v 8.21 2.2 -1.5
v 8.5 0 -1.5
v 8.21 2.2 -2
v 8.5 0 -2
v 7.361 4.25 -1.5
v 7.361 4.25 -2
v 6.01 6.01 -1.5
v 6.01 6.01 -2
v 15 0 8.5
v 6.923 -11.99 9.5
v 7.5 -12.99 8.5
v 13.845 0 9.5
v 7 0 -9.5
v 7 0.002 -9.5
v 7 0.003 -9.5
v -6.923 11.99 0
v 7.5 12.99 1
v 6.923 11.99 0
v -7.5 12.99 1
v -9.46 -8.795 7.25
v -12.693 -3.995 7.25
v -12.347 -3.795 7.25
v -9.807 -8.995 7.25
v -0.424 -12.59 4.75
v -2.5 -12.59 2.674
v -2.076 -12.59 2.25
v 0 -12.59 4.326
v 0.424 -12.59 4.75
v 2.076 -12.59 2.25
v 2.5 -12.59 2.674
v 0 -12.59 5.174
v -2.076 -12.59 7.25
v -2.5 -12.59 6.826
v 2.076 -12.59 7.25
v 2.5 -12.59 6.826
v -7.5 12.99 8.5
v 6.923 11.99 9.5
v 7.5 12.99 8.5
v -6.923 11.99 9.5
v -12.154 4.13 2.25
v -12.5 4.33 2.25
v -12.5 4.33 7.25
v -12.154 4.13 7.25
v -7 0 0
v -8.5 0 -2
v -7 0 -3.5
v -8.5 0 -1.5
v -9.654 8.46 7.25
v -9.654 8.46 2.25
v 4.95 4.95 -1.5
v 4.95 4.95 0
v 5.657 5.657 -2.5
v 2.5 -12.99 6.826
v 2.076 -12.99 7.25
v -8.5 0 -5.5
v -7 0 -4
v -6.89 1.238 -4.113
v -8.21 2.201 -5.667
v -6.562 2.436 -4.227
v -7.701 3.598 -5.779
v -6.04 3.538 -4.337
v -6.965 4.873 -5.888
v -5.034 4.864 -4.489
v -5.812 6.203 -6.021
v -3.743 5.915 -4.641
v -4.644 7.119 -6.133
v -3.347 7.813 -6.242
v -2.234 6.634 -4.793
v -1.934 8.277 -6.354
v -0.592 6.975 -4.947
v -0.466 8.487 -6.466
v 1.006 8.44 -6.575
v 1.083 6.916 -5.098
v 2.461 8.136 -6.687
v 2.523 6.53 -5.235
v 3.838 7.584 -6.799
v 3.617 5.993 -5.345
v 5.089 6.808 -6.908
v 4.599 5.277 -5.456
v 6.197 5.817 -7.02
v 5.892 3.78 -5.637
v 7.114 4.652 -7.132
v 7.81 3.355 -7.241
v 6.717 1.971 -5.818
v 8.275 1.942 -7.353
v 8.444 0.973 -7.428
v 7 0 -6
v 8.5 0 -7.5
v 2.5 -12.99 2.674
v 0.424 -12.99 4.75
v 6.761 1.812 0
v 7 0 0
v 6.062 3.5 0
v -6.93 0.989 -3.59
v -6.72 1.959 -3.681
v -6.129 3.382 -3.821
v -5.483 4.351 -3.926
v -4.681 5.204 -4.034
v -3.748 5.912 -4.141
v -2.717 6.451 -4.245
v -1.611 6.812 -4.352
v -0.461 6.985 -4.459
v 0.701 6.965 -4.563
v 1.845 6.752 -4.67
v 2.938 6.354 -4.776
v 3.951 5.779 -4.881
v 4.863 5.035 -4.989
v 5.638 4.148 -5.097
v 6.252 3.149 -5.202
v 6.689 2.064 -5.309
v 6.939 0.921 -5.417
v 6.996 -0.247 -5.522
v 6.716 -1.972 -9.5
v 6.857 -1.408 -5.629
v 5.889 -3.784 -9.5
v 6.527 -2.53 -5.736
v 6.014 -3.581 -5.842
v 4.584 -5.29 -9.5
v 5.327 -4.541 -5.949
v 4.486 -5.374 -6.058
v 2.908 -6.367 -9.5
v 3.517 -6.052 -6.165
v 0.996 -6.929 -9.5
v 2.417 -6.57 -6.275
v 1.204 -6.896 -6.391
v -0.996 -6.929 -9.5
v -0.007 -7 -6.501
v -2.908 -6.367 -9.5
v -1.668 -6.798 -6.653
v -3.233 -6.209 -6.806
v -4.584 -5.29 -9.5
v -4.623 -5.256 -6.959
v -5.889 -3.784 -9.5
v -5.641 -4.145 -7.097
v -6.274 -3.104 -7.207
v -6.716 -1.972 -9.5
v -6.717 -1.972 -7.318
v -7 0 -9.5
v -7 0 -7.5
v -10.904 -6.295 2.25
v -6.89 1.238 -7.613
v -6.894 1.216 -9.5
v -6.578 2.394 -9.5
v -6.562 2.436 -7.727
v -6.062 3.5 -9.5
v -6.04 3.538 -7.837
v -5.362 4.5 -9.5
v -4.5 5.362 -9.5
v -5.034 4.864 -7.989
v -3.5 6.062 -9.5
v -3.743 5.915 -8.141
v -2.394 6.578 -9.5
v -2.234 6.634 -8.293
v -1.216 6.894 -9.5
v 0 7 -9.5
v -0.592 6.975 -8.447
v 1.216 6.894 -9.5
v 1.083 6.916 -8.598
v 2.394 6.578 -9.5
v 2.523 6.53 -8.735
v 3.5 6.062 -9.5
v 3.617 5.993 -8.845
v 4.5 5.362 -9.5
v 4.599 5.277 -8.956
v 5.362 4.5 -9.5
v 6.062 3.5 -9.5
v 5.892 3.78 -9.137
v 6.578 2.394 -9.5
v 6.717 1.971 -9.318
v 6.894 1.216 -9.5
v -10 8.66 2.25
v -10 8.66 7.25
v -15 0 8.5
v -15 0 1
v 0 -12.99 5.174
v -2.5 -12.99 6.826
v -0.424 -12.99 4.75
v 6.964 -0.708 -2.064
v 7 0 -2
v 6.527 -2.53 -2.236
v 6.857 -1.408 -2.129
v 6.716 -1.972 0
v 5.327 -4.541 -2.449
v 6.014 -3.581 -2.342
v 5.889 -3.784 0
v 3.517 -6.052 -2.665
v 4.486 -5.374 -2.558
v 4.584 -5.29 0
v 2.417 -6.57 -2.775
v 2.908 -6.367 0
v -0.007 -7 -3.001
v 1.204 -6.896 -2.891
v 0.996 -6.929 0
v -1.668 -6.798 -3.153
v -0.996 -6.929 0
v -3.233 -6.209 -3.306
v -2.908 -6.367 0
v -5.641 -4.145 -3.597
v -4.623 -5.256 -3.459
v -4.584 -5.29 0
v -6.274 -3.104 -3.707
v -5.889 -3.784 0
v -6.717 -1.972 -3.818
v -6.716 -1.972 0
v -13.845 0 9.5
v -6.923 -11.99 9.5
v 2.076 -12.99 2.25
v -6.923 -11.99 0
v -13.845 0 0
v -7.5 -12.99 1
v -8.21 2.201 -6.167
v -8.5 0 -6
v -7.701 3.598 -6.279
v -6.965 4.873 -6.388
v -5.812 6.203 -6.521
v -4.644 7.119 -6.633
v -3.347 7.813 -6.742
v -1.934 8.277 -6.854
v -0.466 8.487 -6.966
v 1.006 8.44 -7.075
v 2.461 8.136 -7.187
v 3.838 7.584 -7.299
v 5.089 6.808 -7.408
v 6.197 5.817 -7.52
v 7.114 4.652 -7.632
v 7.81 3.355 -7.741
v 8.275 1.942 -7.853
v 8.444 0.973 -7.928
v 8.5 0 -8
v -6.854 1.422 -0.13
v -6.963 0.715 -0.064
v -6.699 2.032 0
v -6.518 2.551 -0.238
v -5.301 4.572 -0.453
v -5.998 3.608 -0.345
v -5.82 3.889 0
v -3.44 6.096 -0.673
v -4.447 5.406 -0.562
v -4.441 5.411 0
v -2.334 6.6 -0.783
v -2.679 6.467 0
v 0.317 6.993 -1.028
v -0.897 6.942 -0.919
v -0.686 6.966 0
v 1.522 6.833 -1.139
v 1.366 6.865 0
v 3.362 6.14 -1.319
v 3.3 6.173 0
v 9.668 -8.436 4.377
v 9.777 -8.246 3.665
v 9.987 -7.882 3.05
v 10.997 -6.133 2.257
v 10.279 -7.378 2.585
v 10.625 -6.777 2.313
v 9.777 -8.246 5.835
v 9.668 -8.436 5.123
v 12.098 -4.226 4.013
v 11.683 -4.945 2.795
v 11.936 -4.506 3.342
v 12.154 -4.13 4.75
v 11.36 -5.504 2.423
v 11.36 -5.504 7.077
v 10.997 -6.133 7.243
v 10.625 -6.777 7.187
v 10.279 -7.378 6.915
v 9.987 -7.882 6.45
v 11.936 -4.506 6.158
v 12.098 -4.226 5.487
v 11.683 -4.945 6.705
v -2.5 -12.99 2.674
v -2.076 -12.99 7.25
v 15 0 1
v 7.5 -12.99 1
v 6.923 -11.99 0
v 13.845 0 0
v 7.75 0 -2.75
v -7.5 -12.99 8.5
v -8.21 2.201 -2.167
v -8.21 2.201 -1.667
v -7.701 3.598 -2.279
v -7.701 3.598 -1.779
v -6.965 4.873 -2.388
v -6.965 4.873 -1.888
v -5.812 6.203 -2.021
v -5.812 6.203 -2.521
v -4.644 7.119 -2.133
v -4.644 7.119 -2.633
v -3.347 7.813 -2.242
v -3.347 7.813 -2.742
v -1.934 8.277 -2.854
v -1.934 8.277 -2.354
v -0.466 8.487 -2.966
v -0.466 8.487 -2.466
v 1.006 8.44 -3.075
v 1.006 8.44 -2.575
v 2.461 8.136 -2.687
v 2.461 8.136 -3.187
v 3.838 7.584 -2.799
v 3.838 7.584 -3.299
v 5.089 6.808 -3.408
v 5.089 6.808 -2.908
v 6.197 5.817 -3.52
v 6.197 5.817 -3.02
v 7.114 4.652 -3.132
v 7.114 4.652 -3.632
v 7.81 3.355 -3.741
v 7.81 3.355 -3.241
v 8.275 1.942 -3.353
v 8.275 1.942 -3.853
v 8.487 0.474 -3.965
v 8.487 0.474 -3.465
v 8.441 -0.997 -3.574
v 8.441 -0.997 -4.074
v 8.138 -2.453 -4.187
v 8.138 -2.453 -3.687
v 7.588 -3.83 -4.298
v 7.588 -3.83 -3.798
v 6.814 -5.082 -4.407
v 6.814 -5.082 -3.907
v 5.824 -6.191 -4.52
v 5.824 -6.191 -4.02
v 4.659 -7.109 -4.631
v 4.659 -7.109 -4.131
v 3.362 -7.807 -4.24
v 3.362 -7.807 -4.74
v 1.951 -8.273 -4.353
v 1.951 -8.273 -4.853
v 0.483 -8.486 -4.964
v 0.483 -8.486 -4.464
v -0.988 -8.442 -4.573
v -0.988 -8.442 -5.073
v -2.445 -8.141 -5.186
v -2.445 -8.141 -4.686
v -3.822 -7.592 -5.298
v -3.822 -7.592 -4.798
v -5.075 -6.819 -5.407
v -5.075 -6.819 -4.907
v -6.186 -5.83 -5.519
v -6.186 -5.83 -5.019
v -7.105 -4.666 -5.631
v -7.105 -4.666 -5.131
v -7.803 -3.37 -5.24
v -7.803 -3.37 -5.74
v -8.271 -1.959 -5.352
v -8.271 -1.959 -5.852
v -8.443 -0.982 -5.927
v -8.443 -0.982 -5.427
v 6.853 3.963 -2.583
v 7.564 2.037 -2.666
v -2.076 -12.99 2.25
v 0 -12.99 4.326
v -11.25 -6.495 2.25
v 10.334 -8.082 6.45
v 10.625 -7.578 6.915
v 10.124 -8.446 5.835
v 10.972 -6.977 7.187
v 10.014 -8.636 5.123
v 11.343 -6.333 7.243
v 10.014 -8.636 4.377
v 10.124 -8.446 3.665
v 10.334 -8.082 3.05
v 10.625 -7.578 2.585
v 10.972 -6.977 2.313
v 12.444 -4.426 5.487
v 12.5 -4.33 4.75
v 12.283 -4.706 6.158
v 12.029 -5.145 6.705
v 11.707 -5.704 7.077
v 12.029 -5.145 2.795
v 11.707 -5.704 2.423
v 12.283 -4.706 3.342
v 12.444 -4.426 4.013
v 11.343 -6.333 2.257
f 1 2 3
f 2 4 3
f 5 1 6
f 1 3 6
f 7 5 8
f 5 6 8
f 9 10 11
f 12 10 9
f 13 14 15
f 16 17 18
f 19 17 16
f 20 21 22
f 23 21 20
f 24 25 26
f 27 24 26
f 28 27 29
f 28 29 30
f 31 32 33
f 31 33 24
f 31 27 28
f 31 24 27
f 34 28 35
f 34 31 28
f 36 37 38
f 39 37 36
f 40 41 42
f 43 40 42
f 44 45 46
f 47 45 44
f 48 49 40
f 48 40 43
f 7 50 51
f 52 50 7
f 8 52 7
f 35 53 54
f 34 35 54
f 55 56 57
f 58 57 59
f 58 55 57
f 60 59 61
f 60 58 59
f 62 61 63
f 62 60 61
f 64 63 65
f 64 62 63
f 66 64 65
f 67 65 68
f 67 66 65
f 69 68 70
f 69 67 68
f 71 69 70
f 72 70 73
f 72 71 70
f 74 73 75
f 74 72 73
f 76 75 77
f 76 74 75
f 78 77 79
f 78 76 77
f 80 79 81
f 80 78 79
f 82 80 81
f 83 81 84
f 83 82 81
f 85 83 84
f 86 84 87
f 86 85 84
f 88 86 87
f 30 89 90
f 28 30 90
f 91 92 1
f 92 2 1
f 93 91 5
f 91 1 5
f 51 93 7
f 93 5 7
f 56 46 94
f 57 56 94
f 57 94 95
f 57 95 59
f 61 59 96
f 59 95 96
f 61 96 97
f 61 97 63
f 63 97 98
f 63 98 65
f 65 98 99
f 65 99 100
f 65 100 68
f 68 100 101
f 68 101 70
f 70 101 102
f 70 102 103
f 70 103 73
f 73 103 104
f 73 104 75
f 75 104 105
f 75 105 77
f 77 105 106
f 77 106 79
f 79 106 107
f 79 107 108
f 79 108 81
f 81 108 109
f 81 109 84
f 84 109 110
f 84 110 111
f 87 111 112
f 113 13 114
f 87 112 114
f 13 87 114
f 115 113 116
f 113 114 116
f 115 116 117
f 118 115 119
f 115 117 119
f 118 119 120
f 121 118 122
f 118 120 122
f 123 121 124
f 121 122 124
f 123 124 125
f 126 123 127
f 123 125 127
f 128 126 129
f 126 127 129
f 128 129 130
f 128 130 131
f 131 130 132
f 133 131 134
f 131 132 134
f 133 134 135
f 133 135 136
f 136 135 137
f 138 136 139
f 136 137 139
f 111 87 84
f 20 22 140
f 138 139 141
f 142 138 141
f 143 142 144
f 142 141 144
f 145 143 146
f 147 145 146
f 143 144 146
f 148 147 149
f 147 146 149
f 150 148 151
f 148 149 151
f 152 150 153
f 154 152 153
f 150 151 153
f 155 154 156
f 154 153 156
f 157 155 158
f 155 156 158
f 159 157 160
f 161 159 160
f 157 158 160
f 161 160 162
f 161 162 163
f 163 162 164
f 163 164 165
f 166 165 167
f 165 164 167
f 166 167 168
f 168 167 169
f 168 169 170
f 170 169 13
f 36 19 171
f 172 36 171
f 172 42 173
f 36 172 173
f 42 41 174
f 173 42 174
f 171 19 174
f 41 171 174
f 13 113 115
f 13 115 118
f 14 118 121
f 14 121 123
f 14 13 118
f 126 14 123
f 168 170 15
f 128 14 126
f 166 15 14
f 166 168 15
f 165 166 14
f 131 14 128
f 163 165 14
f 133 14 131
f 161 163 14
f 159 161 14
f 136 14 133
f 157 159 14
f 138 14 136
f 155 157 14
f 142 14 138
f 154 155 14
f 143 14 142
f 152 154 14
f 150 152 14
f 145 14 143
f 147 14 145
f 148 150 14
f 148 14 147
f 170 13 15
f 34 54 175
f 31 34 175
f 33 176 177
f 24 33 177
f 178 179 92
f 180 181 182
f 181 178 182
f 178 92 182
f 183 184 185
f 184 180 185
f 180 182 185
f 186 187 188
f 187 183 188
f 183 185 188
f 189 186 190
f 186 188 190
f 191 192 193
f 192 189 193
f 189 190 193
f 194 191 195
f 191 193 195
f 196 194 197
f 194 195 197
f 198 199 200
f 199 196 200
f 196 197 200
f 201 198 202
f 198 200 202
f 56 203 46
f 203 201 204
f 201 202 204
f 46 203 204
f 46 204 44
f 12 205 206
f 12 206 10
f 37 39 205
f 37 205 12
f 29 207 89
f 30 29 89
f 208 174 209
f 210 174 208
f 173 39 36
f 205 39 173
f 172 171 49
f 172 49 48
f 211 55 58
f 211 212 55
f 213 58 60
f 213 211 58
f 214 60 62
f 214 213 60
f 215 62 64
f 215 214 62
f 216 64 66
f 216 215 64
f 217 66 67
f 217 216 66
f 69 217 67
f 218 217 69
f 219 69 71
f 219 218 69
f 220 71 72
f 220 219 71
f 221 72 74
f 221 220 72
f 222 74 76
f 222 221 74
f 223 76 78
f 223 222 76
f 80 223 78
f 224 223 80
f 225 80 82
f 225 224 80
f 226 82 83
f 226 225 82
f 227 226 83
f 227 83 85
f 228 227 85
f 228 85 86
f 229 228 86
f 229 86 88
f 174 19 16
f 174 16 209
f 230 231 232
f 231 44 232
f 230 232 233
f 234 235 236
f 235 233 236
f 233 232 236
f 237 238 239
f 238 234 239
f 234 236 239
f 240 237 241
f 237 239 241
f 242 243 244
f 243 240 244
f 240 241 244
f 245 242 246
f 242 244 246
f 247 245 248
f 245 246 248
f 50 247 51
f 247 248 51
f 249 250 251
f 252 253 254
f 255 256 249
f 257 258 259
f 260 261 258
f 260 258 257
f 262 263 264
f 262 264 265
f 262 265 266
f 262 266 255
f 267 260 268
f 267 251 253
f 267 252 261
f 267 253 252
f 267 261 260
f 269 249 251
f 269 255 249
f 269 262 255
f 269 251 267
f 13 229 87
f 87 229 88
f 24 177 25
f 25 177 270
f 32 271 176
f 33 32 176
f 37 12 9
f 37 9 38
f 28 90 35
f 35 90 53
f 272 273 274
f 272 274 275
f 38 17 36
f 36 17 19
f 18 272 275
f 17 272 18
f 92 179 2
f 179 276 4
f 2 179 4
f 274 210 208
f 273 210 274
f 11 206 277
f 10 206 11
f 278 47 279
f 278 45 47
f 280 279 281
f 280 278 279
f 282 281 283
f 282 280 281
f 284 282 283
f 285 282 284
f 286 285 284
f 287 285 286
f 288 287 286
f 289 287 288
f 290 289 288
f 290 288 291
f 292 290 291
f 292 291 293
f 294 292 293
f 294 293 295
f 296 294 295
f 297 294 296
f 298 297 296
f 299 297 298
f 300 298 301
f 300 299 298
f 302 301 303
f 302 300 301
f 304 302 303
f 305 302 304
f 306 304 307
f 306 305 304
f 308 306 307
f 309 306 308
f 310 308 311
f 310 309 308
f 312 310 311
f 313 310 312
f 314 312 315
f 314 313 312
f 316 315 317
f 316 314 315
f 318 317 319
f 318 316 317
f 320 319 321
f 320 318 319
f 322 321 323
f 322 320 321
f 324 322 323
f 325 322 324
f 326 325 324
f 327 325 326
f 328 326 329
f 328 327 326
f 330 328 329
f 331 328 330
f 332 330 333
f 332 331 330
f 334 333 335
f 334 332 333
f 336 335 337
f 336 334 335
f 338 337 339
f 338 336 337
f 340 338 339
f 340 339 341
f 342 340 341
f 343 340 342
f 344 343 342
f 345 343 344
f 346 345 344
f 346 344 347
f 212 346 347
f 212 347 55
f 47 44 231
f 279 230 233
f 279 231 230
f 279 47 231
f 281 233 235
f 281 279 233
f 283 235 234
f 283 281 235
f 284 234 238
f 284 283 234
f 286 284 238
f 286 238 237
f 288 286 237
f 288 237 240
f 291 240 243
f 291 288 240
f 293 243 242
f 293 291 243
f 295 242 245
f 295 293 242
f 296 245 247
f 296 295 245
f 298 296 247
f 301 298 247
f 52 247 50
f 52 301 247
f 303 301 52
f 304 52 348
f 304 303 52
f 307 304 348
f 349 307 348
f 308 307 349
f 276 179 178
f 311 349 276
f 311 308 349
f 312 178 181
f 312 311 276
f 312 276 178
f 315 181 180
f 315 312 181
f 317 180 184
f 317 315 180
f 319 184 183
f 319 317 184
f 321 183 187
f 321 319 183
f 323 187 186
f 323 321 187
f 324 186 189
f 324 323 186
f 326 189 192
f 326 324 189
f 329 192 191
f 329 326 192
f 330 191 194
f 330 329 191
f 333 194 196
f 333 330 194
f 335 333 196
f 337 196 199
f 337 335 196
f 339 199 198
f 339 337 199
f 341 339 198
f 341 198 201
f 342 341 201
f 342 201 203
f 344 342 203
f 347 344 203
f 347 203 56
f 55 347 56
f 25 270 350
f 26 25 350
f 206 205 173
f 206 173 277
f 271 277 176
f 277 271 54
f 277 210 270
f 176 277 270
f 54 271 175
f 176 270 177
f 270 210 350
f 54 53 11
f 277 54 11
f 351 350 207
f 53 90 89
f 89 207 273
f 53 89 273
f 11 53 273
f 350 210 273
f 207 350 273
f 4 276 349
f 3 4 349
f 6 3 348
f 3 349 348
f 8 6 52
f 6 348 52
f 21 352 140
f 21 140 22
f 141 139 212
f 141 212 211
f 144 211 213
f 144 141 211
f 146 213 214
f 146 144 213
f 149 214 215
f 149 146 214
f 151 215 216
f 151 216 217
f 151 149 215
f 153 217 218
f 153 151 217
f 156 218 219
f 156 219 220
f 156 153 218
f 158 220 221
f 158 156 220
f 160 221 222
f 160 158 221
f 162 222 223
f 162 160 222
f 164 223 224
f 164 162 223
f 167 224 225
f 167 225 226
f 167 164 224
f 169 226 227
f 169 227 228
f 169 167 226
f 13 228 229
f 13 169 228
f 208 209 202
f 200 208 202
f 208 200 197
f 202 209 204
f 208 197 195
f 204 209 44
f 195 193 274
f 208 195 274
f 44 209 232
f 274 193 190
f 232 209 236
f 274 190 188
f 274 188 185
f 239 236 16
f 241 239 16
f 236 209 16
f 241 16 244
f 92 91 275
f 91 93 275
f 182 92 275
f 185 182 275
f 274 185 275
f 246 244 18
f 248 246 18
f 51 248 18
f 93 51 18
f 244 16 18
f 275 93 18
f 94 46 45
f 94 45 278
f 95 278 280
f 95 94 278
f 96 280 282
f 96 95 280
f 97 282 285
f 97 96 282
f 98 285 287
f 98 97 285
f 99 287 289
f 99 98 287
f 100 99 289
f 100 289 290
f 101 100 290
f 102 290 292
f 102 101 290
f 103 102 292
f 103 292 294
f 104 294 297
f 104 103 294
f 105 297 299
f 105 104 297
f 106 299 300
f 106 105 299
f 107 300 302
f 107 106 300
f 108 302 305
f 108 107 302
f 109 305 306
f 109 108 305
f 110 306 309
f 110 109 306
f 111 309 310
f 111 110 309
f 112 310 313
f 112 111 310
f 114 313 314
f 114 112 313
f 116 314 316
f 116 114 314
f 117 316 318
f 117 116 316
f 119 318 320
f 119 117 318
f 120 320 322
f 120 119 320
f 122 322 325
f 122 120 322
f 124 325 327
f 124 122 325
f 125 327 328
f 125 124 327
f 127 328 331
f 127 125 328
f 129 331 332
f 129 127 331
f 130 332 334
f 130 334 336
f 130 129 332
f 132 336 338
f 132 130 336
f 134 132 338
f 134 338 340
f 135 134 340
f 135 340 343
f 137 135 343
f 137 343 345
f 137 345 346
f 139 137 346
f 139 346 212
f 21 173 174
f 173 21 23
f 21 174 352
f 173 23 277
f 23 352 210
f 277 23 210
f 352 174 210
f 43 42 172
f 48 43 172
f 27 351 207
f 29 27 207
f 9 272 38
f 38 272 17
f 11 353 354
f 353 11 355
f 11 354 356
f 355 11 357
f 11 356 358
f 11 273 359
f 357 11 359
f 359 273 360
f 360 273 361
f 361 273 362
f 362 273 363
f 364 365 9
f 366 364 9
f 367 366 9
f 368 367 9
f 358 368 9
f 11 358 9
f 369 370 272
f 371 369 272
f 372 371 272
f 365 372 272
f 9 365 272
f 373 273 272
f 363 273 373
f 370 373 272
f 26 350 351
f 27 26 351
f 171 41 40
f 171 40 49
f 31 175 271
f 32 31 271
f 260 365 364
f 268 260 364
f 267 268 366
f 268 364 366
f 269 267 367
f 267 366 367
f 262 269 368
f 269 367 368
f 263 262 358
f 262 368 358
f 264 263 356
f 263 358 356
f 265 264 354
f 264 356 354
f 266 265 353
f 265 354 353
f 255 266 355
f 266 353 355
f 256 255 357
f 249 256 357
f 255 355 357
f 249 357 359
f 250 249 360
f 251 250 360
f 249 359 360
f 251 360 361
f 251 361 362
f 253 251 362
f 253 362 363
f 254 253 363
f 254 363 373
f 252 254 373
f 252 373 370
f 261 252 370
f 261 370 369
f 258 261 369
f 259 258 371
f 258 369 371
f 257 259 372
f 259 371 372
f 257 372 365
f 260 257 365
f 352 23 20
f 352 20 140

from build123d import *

# Parameters (mm, degrees)
EXTRUDE_1_DEPTH     = 9.5
SKETCH_6_R          = 7
EXTRUDE_2_DEPTH     = 9.5
SWEEP_1_PITCH       = 4
REVOLVE_2_ANGLE     = 45
CHAMFER_1_SIZE      = 1
CUT_EXTRUDE_2_DEPTH = 0.4
SKETCH_13_R         = 2.5
CUT_EXTRUDE_3_DEPTH = 0.4
CUT_EXTRUDE_4_DEPTH = 0.4
SKETCH_14_W         = 5
SKETCH_14_H         = 5
CUT_EXTRUDE_5_DEPTH = 0.4


with BuildPart() as part:
    # 草图1 → 凸台-拉伸1 (new body)
    with BuildSketch(Plane.XY):
        Polygon((15, 0), (7.5, 12.990381057), (-7.5, 12.990381057), (-15, 0), (-7.5, -12.990381057), (7.5, -12.990381057), align=None)
    extrude(amount=EXTRUDE_1_DEPTH)

    # 草图6 → 凸台-拉伸2 (add)
    with BuildSketch(Plane(origin=(0, 0, 0), x_dir=(-1, 0, 0), z_dir=(0, 0, -1))):
        Circle(SKETCH_6_R)
    extrude(amount=EXTRUDE_2_DEPTH)

    # 扫描1: the profile of 草图8 profile screwed along a right-hand helix of 1.5 turns, 12 arcs to a turn; built about Z, then put on its axis
    sweep_1_z = Axis((0, 0, 0), (0, 0, 1))
    sweep_1_corners = [(6.9997, 0, 1.7503), (6.9997, 0, -1.7503), (8.5, 0, -0.25), (8.5, 0, 0.25)]
    with BuildLine(mode=Mode.PRIVATE) as sweep_1_profile:
        Line(sweep_1_corners[0], sweep_1_corners[1])
        Line(sweep_1_corners[1], sweep_1_corners[2])
        Line(sweep_1_corners[2], sweep_1_corners[3])
        Line(sweep_1_corners[3], sweep_1_corners[0])
    sweep_1_cap = Face(sweep_1_profile.wire())
    sweep_1_turn_angles = [0, 15, 30, 45, 60, 75, 90, 105, 120, 135, 150, 165, 180, 195, 210, 225, 240, 255, 270, 285, 300, 315, 330, 345, 360]
    sweep_1_turn_weights = [1, 0.9659258262890683, 1, 0.9659258262890683, 1, 0.9659258262890683, 1, 0.9659258262890683, 1, 0.9659258262890683, 1, 0.9659258262890683, 1, 0.9659258262890683, 1, 0.9659258262890683, 1, 0.9659258262890683, 1, 0.9659258262890683, 1, 0.9659258262890683, 1, 0.9659258262890683, 1]
    sweep_1_turn_rails = [Edge.make_bspline([Vector(p[0], p[1], 0).rotate(sweep_1_z, sweep_1_turn_angles[k]) / sweep_1_turn_weights[k] + Vector(0, 0, p[2] + SWEEP_1_PITCH * sweep_1_turn_angles[k] / 360) for k in range(25)], [0, 0, 0, 1, 1, 2, 2, 3, 3, 4, 4, 5, 5, 6, 6, 7, 7, 8, 8, 9, 9, 10, 10, 11, 11, 12, 12, 12], 2, sweep_1_turn_weights) for p in sweep_1_corners]
    sweep_1_turn_sides = [Face.make_surface_from_curves(sweep_1_turn_rails[p[0]], sweep_1_turn_rails[p[1]]) for p in [(0, 1), (1, 2), (2, 3), (3, 0)]]
    sweep_1_last_angles = [360, 375, 390, 405, 420, 435, 450, 465, 480, 495, 510, 525, 540]
    sweep_1_last_weights = [1, 0.9659258262890683, 1, 0.9659258262890683, 1, 0.9659258262890683, 1, 0.9659258262890683, 1, 0.9659258262890683, 1, 0.965925826289066, 1]
    sweep_1_last_rails = [Edge.make_bspline([Vector(p[0], p[1], 0).rotate(sweep_1_z, sweep_1_last_angles[k]) / sweep_1_last_weights[k] + Vector(0, 0, p[2] + SWEEP_1_PITCH * sweep_1_last_angles[k] / 360) for k in range(13)], [0, 0, 0, 1, 1, 2, 2, 3, 3, 4, 4, 5, 5, 6, 6, 6], 2, sweep_1_last_weights) for p in sweep_1_corners]
    sweep_1_last_sides = [Face.make_surface_from_curves(sweep_1_last_rails[p[0]], sweep_1_last_rails[p[1]]) for p in [(0, 1), (1, 2), (2, 3), (3, 0)]]
    sweep_1 = Plane(origin=(0, 0, -1.75), x_dir=(-1, 0, 0), z_dir=(0, 0, -1)) * Solid(Shell([*sweep_1_turn_sides, *sweep_1_last_sides, sweep_1_cap, sweep_1_cap.rotate(sweep_1_z, 540).moved(Location((0, 0, SWEEP_1_PITCH * 540 / 360)))]))
    add(sweep_1)

    # 草图9 → 旋转2 (revolve)
    with BuildSketch(Plane(origin=(0, 0, 0), x_dir=(1, 0, 0), z_dir=(0, 1, 0))):
        Polygon((7, 3.5), (7, 0), (8.5, 1.5), (8.5, 2), align=None)
    revolve(axis=Axis((0, 0, 0), (0, 0, 1)), revolution_arc=REVOLVE_2_ANGLE)

    # 倒角1
    chamfer_1_edges = [part.edges().sort_by_distance(p)[0] for p in [
        (-11.25, 6.495190528, 9.5),
        (-11.25, -6.495190528, 9.5),
        (0, -12.990381057, 9.5),
        (11.25, -6.495190528, 9.5),
        (11.25, 6.495190528, 9.5),
        (11.25, -6.495190528, 0),
        (0, -12.990381057, 0),
        (-11.25, -6.495190528, 0),
        (-11.25, 6.495190528, 0),
        (0, 12.990381057, 0),
        (11.25, 6.495190528, 0),
        (0, 12.990381057, 9.5),
    ]]
    chamfer(chamfer_1_edges, length=CHAMFER_1_SIZE)

    # 草图11 → 切除-拉伸2 (cut)
    with BuildSketch(Plane(origin=(-11.25, -6.495190528, 0), x_dir=(0, 0, 1), z_dir=(-0.8660254037844389, -0.4999999999999995, 0))):
        Polygon((2.25, 0), (7.25, 2.886751346), (7.25, -2.886751346), align=None)
    extrude(amount=-CUT_EXTRUDE_2_DEPTH, mode=Mode.SUBTRACT)

    # 草图13 → 切除-拉伸3 (cut)
    with BuildSketch(Plane(origin=(11.25, -6.495190528, 0), x_dir=(0, 0, -1), z_dir=(0.8660254037844387, -0.5000000000000001, 0))):
        with Locations(Location((-4.75, 0, 0), (0, 0, 90))):
            Circle(SKETCH_13_R)
    extrude(amount=-CUT_EXTRUDE_3_DEPTH, mode=Mode.SUBTRACT)

    # 草图12 → 切除-拉伸4 (cut)
    with BuildSketch(Plane.XZ.offset(12.990381057)):
        Polygon((-2.5, 6.825735931), (2.075735931, 2.25), (2.5, 2.674264069), (-2.075735931, 7.25), align=None)
        Polygon((2.075735931, 7.25), (-2.5, 2.674264069), (-2.075735931, 2.25), (2.5, 6.825735931), align=None)
    extrude(amount=-CUT_EXTRUDE_4_DEPTH, mode=Mode.SUBTRACT)

    # 草图14 → 切除-拉伸5 (cut)
    with BuildSketch(Plane(origin=(-11.25, 6.495190528, 0), x_dir=(0, 0, 1), z_dir=(-0.8660254037844384, 0.5000000000000006, 0))):
        with Locations((4.75, 0)):
            Rectangle(SKETCH_14_W, SKETCH_14_H)
    extrude(amount=-CUT_EXTRUDE_5_DEPTH, mode=Mode.SUBTRACT)


solid = part.part
